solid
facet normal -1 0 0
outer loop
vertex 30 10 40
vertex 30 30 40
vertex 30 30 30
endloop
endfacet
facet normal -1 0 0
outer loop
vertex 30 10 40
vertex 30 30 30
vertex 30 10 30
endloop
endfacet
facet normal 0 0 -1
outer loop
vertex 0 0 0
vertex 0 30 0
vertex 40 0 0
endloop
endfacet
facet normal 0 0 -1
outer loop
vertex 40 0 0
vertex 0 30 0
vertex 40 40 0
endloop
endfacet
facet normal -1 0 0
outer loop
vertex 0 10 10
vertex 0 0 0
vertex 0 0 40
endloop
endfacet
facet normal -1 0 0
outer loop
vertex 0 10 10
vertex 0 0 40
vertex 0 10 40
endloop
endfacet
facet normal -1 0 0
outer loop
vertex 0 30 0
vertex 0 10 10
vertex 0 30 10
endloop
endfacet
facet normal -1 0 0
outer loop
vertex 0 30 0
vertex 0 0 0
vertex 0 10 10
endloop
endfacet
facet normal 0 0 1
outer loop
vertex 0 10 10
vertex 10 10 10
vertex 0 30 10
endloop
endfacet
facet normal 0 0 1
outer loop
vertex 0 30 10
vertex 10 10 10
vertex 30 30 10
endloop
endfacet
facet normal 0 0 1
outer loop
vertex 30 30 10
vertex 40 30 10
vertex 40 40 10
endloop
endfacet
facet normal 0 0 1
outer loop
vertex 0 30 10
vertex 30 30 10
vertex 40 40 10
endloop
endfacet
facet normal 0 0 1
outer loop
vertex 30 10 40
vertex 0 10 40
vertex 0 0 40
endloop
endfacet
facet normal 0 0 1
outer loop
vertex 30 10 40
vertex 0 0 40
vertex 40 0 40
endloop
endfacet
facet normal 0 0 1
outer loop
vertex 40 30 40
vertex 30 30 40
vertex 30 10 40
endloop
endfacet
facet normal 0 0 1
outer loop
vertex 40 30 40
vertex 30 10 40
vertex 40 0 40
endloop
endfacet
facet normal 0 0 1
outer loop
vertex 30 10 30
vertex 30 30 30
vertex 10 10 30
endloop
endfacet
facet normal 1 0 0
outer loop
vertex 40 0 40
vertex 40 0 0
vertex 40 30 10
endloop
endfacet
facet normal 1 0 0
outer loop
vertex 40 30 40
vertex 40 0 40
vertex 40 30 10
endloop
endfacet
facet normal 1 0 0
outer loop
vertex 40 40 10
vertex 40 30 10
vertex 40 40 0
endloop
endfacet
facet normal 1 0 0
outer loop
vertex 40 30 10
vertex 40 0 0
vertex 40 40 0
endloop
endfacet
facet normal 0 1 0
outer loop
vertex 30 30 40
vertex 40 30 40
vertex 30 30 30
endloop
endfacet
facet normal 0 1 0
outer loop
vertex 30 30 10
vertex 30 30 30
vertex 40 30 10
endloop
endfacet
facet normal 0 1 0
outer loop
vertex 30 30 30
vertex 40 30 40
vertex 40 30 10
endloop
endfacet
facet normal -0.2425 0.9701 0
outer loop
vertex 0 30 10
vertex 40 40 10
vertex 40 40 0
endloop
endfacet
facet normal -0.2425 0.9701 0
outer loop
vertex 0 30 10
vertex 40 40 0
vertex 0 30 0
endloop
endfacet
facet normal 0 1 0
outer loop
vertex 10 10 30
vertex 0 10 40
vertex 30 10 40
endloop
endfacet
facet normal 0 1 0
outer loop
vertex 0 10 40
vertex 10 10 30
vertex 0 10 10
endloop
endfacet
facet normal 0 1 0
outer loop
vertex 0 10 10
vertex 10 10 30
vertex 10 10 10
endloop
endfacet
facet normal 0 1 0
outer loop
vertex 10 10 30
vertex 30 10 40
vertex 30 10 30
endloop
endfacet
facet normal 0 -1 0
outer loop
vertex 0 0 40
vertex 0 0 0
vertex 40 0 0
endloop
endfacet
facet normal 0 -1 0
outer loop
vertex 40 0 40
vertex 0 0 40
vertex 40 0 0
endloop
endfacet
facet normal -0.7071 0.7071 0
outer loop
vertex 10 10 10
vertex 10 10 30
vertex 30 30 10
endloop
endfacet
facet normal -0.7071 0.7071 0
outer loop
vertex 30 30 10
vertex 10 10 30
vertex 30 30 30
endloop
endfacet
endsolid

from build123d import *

# Parameters (mm, degrees)
SKETCH1_W           = 40
SKETCH1_H           = 40
BOSS_EXTRUDE1_DEPTH = 40
CUT_EXTRUDE1_DEPTH  = 40
SKETCH3_W           = 30
SKETCH3_H           = 10
CUT_EXTRUDE2_DEPTH  = 40
CUT_EXTRUDE6_DEPTH  = 30
SKETCH6_W           = 30
SKETCH6_H           = 20
CUT_EXTRUDE7_DEPTH  = 30
CUT_EXTRUDE9_DEPTH  = 10


with BuildPart() as part:
    # Sketch1 → Boss-Extrude1 (new body)
    with BuildSketch(Plane.XY):
        with Locations((20, 20)):
            Rectangle(SKETCH1_W, SKETCH1_H)
    extrude(amount=BOSS_EXTRUDE1_DEPTH)

    # Sketch2 → Cut-Extrude1 (cut)
    with BuildSketch(Plane.XY.offset(40)):
        Polygon((40, 40), (0, 30), (0, 40), align=None)
    extrude(amount=-CUT_EXTRUDE1_DEPTH, mode=Mode.SUBTRACT)

    # Sketch3 → Cut-Extrude2 (cut)
    with BuildSketch(Plane(origin=(40, 0, 0), x_dir=(0, 0, -1), z_dir=(1, 0, 0))):
        with Locations((-25, 35)):
            Rectangle(SKETCH3_W, SKETCH3_H)
    extrude(amount=-CUT_EXTRUDE2_DEPTH, mode=Mode.SUBTRACT)

    # Sketch4 → Cut-Extrude6 (cut)
    with BuildSketch(Plane.XY.offset(40)):
        Polygon((30, 30), (10, 30), (10, 10), align=None)
    extrude(amount=-CUT_EXTRUDE6_DEPTH, mode=Mode.SUBTRACT)

    # Sketch6 → Cut-Extrude7 (cut)
    with BuildSketch(Plane(origin=(10, 0, 0), x_dir=(0, 0, -1), z_dir=(1, 0, 0))):
        with Locations((-25, 20)):
            Rectangle(SKETCH6_W, SKETCH6_H)
    extrude(amount=-CUT_EXTRUDE7_DEPTH, mode=Mode.SUBTRACT)

    # Sketch7 → Cut-Extrude9 (cut)
    with BuildSketch(Plane.XY.offset(40)):
        Polygon((30, 30), (30, 10), (10, 10), align=None)
    extrude(amount=-CUT_EXTRUDE9_DEPTH, mode=Mode.SUBTRACT)


solid = part.part
